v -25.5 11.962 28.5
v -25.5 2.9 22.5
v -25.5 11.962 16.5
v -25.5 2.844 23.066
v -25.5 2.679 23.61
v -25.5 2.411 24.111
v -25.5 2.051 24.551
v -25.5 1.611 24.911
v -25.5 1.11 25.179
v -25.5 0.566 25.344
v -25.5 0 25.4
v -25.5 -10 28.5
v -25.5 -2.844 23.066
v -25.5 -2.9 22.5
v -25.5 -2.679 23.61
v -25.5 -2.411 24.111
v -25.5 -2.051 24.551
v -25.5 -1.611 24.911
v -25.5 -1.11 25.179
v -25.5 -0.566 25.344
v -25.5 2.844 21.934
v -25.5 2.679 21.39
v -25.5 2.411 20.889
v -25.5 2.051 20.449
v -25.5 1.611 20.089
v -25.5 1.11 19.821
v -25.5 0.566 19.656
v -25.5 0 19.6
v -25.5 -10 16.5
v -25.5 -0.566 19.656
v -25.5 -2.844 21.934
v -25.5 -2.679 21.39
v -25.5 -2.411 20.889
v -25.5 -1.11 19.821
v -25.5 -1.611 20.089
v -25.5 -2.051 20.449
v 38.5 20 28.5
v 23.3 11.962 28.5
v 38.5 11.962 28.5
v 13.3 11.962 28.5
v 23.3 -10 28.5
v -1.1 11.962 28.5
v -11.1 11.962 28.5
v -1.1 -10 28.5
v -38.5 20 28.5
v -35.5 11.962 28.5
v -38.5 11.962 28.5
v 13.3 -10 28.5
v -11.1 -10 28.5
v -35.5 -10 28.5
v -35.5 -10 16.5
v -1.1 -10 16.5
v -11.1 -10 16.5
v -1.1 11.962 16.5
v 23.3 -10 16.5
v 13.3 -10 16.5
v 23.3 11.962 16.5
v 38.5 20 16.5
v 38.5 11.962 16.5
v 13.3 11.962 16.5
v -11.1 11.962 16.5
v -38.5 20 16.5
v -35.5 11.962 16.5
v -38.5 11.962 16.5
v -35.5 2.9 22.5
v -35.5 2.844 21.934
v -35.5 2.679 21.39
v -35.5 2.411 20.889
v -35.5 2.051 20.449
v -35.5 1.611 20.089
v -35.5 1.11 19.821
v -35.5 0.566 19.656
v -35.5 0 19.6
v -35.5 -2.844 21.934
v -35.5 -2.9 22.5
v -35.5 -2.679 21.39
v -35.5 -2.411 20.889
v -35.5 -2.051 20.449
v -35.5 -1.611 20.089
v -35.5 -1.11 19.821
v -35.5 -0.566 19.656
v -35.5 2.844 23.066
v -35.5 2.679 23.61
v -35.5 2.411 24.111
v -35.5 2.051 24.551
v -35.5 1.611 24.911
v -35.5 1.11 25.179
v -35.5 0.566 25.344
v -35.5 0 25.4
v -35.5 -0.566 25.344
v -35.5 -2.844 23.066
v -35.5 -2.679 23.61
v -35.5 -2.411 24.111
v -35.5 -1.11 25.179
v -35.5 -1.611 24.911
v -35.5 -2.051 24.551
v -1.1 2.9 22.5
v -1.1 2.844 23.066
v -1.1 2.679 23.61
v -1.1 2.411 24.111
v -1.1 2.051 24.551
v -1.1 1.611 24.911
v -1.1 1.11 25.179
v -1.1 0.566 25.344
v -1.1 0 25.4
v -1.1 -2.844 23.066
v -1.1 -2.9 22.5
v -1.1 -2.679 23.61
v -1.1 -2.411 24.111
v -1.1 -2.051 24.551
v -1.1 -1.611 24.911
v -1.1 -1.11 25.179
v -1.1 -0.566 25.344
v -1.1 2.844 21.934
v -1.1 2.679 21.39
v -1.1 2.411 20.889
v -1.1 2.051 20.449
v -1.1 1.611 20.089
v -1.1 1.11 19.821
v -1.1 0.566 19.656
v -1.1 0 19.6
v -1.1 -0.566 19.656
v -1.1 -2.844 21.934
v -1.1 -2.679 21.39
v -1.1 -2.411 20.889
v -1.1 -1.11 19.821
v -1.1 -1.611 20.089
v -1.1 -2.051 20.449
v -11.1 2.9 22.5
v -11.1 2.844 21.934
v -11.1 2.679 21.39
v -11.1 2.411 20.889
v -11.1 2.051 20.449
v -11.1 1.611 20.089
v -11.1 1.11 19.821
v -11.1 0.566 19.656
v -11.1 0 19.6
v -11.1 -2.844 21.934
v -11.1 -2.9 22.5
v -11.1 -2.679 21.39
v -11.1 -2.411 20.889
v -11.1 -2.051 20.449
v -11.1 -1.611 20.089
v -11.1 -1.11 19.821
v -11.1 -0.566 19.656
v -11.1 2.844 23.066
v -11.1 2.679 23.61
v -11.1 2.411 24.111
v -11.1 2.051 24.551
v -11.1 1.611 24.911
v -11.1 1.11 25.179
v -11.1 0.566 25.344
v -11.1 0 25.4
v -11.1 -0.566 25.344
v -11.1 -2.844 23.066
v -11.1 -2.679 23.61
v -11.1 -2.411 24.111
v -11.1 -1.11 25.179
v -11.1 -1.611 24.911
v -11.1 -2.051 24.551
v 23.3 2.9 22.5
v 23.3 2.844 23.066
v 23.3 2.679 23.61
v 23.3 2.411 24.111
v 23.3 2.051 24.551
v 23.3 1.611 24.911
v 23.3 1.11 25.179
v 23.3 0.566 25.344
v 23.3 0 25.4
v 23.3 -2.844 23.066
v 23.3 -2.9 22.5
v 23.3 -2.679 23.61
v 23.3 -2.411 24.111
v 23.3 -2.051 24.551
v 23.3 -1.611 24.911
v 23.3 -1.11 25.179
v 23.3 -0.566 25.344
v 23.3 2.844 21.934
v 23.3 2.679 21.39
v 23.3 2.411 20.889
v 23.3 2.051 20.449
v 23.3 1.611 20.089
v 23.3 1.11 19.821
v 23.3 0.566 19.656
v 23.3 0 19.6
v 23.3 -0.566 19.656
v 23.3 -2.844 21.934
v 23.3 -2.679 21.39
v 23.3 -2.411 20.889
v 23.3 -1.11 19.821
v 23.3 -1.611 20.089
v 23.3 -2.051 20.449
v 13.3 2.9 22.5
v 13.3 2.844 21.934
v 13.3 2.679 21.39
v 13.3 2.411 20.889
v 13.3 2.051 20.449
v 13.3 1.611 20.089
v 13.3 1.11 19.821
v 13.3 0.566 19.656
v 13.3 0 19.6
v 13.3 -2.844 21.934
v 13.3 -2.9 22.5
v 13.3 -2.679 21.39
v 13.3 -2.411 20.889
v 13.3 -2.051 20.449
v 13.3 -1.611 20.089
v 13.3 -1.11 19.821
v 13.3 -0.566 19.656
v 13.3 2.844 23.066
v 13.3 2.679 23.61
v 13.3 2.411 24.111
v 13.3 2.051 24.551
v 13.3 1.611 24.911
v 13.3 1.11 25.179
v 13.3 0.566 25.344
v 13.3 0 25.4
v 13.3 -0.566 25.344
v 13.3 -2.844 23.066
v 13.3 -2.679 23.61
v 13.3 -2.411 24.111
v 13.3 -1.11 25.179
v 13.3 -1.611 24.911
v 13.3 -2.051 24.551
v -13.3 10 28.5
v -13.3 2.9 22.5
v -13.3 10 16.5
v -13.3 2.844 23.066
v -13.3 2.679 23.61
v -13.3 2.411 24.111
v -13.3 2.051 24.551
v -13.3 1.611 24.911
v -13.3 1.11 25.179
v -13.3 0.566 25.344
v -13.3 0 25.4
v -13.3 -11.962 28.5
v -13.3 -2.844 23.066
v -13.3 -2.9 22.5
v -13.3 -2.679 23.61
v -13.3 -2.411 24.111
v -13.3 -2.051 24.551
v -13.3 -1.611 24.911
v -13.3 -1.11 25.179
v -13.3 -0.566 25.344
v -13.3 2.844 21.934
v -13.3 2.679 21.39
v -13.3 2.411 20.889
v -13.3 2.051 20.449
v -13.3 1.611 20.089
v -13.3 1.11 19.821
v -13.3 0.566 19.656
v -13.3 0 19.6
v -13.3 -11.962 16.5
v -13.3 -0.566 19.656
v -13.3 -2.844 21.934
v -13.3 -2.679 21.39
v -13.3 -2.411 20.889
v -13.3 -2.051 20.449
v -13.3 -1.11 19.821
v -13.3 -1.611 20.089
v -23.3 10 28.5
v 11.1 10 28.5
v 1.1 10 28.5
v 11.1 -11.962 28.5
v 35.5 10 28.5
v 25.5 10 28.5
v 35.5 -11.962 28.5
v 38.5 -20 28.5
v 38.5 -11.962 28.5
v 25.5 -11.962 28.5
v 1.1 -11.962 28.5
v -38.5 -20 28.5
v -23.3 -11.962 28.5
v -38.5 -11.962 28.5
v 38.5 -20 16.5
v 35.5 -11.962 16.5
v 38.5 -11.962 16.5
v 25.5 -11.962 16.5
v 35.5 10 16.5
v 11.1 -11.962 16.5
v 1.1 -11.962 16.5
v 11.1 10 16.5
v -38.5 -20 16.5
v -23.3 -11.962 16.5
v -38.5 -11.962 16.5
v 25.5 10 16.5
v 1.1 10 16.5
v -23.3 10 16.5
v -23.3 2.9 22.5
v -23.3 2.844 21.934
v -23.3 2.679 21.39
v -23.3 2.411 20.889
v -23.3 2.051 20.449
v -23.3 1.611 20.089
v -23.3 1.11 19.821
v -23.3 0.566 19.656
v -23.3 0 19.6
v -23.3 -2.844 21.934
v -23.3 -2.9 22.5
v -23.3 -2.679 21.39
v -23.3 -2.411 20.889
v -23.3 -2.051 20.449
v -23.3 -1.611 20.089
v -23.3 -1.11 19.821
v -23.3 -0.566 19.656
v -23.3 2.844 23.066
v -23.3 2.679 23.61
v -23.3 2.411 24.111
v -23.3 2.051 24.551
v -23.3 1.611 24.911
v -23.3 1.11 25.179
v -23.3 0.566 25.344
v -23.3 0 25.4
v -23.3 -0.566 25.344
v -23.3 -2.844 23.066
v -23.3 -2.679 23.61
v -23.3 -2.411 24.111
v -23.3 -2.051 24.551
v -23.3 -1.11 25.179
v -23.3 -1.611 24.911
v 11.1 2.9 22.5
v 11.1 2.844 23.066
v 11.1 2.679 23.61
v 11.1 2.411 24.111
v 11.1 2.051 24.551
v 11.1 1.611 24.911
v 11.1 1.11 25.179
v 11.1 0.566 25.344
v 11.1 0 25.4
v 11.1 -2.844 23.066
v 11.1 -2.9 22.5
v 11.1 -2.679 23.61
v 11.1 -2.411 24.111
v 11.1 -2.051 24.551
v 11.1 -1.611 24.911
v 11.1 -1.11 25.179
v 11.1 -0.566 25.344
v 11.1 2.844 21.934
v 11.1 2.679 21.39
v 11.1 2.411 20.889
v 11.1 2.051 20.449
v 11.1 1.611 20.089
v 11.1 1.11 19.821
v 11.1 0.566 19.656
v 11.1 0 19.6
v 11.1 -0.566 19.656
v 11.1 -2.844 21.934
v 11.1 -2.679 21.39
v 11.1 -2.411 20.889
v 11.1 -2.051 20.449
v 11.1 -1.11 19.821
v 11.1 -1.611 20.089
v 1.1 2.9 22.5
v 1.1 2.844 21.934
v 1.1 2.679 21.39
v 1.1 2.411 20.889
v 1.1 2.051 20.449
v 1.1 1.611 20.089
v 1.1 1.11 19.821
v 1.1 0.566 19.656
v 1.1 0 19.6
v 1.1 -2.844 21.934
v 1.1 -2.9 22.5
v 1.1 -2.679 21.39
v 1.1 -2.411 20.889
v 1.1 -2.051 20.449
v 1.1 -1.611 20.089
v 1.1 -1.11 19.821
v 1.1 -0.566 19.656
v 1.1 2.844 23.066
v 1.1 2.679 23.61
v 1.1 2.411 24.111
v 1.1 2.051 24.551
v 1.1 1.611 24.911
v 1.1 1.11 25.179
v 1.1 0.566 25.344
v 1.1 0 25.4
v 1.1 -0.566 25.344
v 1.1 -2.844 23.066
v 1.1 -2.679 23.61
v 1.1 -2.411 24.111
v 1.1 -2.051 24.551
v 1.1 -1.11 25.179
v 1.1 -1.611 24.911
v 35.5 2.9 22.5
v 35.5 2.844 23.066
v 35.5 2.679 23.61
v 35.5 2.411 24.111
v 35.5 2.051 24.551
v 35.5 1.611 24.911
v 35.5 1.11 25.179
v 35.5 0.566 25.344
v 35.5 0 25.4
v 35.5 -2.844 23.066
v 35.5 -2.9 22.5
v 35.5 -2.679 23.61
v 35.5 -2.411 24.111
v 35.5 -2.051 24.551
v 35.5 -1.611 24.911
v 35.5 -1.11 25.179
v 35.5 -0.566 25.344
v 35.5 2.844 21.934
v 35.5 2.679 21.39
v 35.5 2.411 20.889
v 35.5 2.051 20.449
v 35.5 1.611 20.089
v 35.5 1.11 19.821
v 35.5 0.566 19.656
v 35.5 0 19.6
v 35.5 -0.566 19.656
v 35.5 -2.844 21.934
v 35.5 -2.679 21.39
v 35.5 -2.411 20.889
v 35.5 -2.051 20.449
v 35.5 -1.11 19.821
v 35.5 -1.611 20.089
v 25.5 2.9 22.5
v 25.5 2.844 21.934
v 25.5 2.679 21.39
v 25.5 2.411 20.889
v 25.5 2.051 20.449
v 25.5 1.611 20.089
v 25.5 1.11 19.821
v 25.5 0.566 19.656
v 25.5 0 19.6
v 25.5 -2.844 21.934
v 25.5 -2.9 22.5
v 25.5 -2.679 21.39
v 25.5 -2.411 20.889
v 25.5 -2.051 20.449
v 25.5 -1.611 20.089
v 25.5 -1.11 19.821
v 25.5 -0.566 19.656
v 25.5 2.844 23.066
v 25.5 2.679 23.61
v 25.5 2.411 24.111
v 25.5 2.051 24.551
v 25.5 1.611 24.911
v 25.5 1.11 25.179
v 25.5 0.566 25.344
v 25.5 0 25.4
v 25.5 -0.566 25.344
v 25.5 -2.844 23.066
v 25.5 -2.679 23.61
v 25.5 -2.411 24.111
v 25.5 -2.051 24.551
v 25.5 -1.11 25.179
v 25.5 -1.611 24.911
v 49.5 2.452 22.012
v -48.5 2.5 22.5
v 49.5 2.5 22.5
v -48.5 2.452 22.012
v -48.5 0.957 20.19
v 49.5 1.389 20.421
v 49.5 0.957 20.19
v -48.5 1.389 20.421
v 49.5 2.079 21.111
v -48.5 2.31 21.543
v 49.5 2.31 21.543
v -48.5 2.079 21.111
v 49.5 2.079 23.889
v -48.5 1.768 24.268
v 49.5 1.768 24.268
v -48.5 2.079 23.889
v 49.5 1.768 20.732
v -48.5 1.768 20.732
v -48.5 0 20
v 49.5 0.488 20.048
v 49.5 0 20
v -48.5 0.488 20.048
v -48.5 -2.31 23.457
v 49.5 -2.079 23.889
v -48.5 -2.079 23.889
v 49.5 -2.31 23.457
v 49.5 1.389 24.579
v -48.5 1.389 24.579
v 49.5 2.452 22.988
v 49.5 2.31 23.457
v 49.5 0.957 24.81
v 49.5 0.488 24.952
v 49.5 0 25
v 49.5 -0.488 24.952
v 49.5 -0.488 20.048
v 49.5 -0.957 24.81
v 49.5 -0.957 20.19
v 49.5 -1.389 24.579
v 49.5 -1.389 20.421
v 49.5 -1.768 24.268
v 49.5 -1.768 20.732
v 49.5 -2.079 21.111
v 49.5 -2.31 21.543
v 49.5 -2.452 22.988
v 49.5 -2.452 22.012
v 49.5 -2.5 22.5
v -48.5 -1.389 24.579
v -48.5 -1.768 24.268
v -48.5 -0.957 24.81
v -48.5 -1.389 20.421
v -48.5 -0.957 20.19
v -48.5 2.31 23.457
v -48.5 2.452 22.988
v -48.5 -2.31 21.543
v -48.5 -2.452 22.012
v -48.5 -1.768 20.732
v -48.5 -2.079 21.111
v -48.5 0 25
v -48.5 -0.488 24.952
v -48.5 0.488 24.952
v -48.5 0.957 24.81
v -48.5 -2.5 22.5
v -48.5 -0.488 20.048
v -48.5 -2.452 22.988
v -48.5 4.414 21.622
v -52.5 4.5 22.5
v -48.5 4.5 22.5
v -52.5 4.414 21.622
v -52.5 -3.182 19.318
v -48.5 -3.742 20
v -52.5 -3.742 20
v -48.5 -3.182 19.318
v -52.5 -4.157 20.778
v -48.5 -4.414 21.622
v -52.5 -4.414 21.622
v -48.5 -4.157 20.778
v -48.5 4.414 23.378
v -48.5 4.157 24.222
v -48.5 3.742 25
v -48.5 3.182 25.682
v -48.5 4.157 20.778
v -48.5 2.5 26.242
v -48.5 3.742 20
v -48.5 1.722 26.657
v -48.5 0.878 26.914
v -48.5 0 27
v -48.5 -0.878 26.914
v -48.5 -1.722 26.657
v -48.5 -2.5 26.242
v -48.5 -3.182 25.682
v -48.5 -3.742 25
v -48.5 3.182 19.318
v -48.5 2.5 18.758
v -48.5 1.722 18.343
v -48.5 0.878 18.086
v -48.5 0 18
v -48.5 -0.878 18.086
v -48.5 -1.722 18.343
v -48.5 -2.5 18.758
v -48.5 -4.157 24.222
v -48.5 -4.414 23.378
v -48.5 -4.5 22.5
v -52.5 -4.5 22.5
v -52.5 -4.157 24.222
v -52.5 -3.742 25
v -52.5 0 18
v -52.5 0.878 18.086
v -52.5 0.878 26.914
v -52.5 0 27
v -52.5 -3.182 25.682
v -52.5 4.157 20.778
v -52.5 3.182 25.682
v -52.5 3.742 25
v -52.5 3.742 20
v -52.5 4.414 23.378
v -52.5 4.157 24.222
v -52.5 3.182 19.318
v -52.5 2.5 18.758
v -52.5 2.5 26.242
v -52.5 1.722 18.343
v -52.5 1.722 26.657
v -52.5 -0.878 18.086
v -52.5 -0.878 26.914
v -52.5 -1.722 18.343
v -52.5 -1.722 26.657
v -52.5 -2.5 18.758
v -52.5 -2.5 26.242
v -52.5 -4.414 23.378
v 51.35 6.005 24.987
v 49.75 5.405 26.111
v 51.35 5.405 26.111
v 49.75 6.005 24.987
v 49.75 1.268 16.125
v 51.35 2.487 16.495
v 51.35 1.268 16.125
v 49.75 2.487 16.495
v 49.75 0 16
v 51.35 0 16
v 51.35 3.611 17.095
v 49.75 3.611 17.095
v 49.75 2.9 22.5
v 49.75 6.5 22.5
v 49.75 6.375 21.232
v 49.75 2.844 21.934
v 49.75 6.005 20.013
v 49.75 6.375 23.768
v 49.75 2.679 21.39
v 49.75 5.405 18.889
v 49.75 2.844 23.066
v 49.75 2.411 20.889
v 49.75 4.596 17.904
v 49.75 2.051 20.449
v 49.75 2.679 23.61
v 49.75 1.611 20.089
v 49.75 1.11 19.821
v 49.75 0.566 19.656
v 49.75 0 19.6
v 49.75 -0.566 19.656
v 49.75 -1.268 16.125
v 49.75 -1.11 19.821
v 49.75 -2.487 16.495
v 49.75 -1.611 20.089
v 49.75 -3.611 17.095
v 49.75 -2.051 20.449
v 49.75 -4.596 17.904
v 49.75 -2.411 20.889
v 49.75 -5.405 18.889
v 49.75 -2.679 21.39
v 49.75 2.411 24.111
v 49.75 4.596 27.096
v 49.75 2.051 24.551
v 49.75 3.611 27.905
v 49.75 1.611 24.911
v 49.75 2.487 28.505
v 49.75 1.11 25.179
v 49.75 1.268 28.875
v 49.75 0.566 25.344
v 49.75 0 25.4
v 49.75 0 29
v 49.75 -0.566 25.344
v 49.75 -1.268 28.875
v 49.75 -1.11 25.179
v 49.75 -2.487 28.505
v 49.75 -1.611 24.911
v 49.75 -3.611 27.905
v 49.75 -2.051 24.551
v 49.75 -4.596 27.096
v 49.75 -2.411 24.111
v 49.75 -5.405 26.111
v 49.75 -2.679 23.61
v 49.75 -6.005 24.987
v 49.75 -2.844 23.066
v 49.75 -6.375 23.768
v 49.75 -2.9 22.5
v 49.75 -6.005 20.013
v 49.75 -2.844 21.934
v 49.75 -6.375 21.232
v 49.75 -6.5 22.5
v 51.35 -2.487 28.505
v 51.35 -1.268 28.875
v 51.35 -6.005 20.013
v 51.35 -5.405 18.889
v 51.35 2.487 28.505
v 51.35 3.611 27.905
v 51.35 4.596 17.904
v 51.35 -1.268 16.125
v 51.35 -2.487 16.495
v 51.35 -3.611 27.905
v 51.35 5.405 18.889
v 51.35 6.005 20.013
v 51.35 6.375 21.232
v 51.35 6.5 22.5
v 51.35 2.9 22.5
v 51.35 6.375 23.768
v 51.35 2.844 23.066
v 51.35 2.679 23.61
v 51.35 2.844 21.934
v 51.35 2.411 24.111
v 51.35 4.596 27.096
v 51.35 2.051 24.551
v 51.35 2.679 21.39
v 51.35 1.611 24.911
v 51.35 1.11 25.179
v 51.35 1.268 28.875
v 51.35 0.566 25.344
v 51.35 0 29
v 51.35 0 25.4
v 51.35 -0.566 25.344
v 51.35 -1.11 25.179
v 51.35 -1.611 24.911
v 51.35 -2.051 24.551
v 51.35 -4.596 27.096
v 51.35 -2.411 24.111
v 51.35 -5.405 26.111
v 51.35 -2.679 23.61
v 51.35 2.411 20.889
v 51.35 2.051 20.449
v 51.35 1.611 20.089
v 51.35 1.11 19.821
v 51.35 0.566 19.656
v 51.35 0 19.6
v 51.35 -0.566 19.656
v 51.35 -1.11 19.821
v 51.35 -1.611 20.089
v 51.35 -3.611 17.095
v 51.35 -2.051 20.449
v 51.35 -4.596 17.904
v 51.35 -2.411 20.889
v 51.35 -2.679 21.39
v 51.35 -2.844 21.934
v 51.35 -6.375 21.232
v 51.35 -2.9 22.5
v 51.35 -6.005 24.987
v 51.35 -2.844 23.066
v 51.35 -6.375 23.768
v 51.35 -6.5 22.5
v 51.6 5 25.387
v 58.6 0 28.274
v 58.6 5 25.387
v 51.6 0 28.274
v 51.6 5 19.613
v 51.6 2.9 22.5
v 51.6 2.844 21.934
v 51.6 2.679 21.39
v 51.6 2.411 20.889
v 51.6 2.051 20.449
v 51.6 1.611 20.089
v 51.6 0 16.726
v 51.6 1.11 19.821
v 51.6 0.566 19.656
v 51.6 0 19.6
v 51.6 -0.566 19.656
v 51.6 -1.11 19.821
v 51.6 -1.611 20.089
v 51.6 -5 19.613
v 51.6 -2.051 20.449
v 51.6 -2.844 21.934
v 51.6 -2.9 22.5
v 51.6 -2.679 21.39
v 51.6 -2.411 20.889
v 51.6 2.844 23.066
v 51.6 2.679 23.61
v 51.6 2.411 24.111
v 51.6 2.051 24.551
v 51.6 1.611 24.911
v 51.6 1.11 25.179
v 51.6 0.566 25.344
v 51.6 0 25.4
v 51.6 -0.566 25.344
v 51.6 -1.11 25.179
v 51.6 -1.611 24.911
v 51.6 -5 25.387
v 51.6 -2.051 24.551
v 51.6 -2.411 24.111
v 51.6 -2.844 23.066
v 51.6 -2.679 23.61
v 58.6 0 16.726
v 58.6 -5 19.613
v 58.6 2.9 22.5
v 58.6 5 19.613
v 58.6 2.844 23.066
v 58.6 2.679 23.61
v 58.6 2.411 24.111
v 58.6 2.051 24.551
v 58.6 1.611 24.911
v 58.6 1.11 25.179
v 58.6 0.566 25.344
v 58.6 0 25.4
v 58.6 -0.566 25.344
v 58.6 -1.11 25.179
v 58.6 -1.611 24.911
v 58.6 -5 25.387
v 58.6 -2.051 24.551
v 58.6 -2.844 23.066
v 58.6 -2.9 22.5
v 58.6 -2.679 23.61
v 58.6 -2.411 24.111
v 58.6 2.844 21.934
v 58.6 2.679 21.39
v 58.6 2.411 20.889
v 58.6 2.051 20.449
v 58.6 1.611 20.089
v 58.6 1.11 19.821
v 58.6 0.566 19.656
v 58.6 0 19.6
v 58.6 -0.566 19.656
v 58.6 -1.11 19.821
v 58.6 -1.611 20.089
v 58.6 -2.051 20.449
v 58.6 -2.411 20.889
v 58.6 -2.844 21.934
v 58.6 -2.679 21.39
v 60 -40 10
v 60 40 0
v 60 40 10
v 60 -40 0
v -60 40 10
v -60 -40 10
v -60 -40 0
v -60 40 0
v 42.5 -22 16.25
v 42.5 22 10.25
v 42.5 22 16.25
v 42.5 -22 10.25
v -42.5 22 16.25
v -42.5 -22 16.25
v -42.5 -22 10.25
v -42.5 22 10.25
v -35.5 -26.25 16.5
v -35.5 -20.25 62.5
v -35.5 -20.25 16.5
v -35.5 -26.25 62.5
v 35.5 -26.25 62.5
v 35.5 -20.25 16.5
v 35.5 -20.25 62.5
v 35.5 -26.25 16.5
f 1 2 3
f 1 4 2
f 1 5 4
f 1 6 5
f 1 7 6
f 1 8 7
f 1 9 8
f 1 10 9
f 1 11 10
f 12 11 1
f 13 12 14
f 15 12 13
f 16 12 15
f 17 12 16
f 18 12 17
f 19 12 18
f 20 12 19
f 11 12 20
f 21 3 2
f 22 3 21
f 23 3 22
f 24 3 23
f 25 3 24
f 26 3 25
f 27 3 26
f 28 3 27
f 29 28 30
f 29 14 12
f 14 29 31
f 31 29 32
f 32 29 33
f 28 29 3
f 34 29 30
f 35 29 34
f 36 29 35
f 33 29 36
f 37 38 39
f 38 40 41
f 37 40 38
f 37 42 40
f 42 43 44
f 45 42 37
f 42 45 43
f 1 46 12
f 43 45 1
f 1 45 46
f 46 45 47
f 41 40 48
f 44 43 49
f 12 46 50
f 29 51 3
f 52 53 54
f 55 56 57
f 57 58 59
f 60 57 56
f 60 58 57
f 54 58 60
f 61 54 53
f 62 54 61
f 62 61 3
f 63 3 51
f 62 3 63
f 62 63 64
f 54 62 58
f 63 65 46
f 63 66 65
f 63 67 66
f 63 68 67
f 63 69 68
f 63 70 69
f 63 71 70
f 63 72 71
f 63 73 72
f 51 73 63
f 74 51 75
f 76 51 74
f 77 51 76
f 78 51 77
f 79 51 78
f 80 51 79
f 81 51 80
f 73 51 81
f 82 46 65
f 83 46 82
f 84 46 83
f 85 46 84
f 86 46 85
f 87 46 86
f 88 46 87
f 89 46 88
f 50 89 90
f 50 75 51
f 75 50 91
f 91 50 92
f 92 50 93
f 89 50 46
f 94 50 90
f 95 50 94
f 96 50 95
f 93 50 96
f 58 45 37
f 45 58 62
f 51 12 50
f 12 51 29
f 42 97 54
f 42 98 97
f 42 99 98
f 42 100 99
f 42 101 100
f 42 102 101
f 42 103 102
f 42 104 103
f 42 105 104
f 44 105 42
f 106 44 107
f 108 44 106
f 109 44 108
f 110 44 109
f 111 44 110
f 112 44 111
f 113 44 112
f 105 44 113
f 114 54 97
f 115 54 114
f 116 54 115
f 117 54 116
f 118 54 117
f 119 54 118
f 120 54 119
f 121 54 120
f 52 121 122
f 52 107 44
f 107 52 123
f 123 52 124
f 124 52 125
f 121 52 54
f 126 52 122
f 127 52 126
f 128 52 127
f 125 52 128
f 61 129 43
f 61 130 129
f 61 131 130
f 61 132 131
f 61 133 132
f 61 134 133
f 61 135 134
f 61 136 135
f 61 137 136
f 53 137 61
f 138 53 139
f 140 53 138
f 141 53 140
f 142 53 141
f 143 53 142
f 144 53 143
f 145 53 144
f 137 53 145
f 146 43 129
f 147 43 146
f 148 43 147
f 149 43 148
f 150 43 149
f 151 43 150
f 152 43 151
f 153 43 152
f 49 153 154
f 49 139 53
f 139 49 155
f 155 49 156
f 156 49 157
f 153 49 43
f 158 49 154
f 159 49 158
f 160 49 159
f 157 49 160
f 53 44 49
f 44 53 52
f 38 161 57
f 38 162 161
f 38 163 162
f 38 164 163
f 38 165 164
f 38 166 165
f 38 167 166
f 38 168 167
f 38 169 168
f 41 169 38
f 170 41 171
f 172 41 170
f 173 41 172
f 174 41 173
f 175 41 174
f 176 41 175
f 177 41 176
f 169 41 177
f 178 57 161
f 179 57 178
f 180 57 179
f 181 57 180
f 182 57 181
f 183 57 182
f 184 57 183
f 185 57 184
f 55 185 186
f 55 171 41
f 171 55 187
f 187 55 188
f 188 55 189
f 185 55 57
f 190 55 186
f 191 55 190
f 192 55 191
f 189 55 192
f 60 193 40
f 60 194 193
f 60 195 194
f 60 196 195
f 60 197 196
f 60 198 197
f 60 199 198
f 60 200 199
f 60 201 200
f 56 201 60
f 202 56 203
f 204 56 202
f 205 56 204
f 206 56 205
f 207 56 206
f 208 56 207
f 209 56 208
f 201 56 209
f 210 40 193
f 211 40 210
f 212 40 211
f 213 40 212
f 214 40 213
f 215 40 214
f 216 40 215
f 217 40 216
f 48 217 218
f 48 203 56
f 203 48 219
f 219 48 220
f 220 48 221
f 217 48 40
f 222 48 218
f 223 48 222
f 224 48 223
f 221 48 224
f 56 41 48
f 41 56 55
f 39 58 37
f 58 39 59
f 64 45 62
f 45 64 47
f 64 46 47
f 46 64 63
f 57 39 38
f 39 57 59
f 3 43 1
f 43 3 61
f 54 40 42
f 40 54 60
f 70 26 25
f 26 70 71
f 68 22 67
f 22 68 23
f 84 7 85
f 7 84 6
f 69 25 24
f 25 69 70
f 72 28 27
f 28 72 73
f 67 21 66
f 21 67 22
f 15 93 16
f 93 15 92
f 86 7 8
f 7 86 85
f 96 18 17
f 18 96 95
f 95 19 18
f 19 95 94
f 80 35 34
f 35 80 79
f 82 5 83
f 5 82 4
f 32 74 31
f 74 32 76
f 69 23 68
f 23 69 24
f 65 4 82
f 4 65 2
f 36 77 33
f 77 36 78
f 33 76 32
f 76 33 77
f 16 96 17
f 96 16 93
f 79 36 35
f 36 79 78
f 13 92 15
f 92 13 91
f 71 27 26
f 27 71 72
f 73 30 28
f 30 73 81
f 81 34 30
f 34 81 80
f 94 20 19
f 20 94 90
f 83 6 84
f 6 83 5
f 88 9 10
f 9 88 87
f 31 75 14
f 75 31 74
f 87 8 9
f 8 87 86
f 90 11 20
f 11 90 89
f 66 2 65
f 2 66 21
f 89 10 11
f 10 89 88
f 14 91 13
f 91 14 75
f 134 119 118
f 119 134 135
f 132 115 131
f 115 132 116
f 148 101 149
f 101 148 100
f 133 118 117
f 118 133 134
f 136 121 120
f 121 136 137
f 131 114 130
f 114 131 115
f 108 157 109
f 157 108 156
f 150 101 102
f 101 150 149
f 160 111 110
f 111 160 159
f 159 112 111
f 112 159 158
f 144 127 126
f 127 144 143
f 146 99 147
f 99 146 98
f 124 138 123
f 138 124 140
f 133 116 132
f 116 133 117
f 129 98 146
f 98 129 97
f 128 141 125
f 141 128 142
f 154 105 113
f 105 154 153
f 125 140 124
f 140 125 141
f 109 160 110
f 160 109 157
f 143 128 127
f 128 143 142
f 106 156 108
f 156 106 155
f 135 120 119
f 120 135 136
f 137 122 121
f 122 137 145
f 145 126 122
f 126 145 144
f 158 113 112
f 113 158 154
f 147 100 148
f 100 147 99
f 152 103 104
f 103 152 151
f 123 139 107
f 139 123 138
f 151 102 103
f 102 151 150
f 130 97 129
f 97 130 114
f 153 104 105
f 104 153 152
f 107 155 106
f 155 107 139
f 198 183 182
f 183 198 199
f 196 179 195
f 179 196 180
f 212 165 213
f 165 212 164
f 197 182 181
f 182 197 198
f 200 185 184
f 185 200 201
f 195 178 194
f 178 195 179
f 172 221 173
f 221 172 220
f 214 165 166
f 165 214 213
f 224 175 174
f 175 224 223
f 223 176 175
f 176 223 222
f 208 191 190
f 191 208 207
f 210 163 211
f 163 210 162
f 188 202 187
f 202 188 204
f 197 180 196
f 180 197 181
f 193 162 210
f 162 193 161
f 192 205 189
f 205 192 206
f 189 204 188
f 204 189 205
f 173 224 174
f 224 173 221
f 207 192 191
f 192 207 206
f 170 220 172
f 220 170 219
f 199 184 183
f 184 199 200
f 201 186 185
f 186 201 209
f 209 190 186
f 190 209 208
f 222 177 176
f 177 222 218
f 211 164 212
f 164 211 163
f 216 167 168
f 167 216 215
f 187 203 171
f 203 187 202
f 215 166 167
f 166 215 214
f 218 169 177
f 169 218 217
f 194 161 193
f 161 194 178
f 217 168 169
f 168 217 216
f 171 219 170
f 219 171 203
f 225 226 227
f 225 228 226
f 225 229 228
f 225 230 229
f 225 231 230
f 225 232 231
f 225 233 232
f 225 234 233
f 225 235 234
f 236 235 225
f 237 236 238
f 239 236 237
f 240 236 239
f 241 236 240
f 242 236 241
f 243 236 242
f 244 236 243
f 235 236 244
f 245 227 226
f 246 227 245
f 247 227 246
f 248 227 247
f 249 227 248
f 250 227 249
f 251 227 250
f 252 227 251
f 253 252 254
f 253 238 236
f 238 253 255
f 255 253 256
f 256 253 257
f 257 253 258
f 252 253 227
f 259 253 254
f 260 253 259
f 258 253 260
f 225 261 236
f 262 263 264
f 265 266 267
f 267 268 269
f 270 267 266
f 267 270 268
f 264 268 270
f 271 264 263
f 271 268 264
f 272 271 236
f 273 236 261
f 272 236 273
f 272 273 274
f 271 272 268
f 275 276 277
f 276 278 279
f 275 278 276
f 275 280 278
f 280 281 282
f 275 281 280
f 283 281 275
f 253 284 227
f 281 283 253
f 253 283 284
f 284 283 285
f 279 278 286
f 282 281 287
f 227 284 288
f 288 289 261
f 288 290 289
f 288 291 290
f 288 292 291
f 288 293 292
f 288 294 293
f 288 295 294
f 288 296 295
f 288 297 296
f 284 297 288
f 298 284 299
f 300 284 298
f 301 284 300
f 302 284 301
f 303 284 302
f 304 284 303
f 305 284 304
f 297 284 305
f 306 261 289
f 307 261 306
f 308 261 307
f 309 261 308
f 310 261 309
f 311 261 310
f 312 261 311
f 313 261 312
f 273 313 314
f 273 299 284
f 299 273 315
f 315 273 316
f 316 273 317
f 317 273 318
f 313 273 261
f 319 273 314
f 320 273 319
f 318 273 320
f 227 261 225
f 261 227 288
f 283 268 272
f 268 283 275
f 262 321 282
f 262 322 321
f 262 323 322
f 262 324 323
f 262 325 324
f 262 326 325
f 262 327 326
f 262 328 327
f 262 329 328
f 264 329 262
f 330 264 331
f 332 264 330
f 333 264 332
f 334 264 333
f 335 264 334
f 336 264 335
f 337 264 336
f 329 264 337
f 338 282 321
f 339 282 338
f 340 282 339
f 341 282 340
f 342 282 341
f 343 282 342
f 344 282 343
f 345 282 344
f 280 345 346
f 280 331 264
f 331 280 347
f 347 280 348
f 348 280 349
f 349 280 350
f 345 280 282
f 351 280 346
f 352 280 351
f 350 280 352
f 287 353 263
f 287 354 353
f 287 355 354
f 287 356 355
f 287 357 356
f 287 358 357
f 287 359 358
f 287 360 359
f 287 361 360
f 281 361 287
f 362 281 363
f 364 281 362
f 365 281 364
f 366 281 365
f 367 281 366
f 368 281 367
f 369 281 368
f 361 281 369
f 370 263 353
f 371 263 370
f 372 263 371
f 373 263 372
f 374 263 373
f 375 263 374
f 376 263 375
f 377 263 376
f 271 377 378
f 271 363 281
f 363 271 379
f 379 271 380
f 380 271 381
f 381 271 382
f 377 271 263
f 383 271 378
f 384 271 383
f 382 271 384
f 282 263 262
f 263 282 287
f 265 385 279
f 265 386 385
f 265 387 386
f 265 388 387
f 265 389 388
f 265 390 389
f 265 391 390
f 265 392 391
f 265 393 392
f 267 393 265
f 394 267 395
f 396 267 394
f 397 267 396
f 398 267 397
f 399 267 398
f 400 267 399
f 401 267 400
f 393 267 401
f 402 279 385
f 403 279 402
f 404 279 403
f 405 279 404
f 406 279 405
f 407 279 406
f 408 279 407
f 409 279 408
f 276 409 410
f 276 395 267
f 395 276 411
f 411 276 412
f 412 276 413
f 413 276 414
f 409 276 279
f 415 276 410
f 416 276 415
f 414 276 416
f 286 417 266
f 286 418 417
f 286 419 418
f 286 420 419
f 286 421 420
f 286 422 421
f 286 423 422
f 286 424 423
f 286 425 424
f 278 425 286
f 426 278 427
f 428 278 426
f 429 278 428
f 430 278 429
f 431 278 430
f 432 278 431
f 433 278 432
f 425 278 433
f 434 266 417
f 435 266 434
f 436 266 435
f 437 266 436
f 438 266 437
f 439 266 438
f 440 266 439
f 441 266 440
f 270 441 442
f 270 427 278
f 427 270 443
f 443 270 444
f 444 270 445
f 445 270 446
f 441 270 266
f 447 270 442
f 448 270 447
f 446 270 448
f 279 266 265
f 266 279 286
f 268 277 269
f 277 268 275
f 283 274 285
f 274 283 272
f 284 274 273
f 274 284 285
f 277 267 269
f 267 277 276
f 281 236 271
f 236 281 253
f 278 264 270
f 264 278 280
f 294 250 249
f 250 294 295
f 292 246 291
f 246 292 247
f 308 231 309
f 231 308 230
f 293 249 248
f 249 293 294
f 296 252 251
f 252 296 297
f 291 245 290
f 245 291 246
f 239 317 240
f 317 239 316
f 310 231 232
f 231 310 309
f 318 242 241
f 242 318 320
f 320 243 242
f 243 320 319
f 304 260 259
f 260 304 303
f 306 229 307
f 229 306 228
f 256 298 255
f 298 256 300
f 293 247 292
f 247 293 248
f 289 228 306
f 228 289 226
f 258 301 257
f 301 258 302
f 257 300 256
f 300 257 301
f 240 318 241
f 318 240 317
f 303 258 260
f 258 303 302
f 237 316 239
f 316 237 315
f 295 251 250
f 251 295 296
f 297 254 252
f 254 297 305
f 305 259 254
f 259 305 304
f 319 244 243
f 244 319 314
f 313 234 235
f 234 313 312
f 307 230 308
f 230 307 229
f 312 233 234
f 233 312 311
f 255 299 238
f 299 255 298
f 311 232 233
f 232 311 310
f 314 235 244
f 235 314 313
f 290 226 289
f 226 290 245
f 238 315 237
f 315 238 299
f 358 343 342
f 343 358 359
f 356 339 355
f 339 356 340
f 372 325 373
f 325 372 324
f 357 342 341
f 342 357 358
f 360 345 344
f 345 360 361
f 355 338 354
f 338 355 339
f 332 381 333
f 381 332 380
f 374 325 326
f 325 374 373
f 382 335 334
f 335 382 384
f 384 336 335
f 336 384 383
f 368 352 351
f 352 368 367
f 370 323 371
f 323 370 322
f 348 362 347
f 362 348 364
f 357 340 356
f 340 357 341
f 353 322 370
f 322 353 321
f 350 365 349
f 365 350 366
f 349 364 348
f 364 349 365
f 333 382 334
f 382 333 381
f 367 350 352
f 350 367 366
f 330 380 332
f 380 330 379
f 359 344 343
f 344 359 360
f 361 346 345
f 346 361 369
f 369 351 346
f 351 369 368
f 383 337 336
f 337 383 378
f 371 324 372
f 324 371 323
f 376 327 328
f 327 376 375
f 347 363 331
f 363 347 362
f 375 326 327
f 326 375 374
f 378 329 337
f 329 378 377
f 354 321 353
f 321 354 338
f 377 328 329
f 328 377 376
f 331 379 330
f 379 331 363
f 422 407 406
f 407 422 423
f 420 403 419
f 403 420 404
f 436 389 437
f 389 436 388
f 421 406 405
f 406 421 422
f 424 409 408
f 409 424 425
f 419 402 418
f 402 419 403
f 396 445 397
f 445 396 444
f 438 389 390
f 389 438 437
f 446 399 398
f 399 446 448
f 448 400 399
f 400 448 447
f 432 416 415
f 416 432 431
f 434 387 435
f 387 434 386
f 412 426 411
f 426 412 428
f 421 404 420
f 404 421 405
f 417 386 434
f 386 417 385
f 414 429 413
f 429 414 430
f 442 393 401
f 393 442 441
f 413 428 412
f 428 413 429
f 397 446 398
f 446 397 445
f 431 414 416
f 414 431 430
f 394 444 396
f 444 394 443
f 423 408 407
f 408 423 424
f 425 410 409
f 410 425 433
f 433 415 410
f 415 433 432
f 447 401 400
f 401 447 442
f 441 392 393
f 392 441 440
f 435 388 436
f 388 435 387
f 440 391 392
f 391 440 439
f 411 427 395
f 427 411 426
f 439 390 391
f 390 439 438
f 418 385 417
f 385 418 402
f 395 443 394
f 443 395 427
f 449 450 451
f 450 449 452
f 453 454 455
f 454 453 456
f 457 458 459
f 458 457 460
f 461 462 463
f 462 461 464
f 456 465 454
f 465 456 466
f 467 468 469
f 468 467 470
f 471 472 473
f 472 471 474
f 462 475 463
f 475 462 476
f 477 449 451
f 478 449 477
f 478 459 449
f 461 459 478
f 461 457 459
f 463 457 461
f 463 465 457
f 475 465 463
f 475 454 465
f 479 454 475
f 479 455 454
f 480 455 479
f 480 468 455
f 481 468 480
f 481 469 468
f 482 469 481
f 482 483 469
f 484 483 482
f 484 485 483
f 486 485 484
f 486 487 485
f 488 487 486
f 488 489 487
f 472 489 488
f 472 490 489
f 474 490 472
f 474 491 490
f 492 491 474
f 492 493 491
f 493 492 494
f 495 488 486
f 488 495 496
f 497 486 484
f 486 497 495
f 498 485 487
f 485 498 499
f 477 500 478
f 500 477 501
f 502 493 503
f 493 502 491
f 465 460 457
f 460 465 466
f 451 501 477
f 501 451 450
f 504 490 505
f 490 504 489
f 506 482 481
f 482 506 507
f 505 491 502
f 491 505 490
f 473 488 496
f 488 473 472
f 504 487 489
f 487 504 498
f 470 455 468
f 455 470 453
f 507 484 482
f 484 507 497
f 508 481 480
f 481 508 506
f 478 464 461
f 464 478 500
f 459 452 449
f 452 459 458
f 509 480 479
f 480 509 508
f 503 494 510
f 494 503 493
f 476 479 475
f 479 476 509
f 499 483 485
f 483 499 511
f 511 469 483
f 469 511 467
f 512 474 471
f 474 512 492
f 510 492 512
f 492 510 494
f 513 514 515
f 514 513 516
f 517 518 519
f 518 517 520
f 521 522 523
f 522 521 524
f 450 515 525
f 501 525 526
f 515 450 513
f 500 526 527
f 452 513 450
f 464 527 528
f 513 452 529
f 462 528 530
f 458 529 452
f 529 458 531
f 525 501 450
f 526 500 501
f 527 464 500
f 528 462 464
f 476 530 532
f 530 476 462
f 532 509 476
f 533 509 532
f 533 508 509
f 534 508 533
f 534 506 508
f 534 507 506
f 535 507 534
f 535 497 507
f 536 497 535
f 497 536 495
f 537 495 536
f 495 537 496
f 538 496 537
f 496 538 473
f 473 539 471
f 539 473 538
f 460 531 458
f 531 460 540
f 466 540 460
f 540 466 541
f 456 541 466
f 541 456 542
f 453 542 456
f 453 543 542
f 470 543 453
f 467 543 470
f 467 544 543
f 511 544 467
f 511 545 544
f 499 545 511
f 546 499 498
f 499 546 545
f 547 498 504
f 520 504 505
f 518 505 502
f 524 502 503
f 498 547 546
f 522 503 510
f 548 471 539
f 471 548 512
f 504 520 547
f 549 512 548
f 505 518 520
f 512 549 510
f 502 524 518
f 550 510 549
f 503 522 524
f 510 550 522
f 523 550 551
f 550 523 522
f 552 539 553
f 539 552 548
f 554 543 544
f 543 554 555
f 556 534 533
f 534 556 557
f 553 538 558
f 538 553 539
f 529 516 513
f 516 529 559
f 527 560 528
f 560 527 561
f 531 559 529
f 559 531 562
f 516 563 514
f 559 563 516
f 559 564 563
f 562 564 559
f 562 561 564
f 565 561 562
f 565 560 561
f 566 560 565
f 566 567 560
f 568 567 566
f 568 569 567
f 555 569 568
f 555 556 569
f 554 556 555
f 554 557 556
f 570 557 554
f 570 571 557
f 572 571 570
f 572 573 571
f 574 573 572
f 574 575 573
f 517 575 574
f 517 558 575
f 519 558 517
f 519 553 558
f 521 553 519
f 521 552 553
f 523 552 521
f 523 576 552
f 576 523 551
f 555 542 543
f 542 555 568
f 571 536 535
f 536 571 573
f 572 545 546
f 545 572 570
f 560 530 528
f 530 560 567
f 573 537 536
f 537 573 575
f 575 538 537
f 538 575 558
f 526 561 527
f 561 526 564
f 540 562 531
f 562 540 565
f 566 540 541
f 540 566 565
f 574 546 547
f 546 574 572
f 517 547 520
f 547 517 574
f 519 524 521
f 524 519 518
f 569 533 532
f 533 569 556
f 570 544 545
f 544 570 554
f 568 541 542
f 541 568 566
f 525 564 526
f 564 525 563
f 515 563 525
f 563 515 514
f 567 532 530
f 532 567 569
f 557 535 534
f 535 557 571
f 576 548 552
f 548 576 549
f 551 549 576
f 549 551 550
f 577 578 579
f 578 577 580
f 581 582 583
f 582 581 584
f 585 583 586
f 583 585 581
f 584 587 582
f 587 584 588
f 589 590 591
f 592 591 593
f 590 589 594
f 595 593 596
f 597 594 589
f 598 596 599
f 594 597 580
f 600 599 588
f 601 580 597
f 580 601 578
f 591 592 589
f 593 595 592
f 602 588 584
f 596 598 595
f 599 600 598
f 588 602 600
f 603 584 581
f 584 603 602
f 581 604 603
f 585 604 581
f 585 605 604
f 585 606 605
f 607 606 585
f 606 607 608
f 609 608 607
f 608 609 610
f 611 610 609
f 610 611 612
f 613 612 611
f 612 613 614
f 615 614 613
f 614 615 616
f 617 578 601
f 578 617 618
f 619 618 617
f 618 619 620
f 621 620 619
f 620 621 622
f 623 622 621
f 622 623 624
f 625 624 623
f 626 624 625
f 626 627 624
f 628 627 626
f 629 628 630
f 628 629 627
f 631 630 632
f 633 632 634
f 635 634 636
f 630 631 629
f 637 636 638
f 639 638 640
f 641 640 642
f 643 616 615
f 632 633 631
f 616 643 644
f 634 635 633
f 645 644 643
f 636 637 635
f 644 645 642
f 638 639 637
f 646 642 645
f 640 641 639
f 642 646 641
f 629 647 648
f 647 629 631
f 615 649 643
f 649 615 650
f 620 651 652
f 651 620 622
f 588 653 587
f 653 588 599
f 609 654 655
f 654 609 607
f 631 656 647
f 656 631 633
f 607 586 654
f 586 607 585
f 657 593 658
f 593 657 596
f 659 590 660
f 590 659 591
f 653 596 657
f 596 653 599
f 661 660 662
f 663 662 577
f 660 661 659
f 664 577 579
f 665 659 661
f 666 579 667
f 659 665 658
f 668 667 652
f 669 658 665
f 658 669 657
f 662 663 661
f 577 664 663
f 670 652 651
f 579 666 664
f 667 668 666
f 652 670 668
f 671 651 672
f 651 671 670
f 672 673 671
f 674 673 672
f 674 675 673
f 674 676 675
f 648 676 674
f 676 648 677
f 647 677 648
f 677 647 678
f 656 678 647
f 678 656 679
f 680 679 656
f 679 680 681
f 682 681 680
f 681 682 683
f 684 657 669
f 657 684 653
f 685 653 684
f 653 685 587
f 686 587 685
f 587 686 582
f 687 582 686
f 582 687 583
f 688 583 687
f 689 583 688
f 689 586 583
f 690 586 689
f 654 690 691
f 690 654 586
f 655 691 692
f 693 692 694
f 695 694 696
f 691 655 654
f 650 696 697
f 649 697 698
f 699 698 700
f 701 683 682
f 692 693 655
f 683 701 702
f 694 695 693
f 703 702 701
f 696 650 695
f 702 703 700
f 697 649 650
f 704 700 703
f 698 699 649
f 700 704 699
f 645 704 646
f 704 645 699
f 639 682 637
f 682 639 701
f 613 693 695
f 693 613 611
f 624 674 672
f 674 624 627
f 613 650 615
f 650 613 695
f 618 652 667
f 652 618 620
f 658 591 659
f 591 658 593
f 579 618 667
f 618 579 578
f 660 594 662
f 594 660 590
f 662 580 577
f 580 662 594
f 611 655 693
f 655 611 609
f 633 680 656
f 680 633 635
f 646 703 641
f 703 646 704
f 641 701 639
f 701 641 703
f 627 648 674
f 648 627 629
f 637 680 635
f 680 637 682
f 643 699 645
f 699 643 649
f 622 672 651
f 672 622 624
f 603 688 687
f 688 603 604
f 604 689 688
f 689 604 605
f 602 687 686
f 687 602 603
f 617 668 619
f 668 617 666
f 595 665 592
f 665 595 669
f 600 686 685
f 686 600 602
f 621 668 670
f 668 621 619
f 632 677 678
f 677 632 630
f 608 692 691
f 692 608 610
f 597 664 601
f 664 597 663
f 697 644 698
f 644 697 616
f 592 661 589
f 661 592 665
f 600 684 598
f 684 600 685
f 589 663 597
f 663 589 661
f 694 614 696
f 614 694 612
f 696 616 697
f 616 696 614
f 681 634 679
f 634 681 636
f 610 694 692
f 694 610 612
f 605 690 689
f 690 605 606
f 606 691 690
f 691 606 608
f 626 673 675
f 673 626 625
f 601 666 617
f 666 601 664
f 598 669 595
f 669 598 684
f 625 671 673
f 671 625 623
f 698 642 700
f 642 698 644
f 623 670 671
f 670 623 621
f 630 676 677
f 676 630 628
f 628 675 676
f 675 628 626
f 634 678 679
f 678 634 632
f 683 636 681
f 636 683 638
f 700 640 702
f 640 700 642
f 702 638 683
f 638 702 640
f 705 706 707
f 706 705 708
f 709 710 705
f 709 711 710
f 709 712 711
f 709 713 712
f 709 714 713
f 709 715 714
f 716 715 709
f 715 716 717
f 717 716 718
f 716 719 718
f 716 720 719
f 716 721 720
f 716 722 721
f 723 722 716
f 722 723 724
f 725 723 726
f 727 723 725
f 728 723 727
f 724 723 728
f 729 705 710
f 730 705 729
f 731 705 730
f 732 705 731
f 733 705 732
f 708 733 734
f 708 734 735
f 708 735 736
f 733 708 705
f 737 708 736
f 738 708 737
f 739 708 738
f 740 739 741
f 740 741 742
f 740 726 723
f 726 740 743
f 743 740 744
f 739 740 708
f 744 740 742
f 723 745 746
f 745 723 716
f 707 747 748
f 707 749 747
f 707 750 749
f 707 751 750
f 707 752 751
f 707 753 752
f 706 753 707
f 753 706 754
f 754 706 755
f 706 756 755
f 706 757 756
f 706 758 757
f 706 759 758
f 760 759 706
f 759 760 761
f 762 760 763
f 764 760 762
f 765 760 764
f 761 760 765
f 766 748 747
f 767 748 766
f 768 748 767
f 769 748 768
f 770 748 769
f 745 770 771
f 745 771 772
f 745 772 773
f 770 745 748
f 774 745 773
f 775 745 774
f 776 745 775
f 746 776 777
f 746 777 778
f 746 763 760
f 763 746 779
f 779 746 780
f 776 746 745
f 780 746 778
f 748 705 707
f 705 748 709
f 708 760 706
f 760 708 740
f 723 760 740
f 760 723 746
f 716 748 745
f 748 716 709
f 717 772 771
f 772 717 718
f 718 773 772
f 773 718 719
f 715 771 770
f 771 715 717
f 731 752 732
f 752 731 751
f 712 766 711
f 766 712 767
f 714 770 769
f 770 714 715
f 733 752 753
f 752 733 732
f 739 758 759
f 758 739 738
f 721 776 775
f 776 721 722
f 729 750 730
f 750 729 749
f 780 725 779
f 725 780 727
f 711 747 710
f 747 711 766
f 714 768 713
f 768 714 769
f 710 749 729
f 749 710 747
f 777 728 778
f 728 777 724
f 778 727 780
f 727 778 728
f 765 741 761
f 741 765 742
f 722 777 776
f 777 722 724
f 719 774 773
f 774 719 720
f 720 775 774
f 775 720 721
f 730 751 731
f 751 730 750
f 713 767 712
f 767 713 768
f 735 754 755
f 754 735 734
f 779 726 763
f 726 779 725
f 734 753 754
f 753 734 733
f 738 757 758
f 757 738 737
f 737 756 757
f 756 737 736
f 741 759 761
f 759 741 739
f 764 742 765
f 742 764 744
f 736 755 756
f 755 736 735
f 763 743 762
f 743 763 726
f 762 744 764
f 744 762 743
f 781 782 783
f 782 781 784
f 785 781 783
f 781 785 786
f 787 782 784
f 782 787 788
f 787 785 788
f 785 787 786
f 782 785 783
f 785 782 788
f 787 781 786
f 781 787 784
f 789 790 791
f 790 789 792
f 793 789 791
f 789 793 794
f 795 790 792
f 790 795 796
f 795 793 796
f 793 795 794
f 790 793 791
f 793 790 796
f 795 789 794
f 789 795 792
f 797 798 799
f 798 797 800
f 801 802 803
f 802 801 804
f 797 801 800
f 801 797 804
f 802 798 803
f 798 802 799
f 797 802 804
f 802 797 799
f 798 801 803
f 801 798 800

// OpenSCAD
$fn = 32;

// ------------------------------------------------------------------------
// Comb hinge with flap: leaf 77 x 20 mm, pin d5, flap 46 mm
// Every part is its own module, assembly() places every instance.
// ------------------------------------------------------------------------

// --- part 1 ---
module hinge_bed() {
  difference() {
    translate([-60, -40, 0]) cube([120, 80, 10]);
  }
}

// --- part 2 ---
module hinge_riser() {
  difference() {
    translate([-42.5, -22, 0]) cube([85, 44, 6]);
  }
}

// --- part 3 ---
module hinge_leaf_a() {
  difference() {
    union() {
      translate([-35.5, -10, -6]) cube([10, 30, 12]);
      translate([-11.1, -10, -6]) cube([10, 30, 12]);
      translate([13.3, -10, -6]) cube([10, 30, 12]);
      translate([-38.5, 11.962, -6]) cube([77, 8.038, 12]);
    }
    translate([-30.5, 0, 0]) rotate([0, 90, 0]) cylinder(h = 12, d = 5.8, center = true);
    translate([-6.1, 0, 0]) rotate([0, 90, 0]) cylinder(h = 12, d = 5.8, center = true);
    translate([18.3, 0, 0]) rotate([0, 90, 0]) cylinder(h = 12, d = 5.8, center = true);
  }
}

// --- part 4 ---
module hinge_leaf_b() {
  difference() {
    union() {
      translate([-23.3, -20, -6]) cube([10, 30, 12]);
      translate([1.1, -20, -6]) cube([10, 30, 12]);
      translate([25.5, -20, -6]) cube([10, 30, 12]);
      translate([-38.5, -20, -6]) cube([77, 8.038, 12]);
    }
    translate([-18.3, 0, 0]) rotate([0, 90, 0]) cylinder(h = 12, d = 5.8, center = true);
    translate([6.1, 0, 0]) rotate([0, 90, 0]) cylinder(h = 12, d = 5.8, center = true);
    translate([30.5, 0, 0]) rotate([0, 90, 0]) cylinder(h = 12, d = 5.8, center = true);
  }
}

// --- part 5 ---
module hinge_flap() {
  difference() {
    translate([-35.5, -23, 0]) cube([71, 46, 6]);
  }
}

// --- part 6 ---
module hinge_pin() {
  rotate([0, 90, 0]) cylinder(h = 99, d = 5, center = true);
  translate([-52.5, 0, 0]) rotate([0, 90, 0]) cylinder(h = 4, d = 9);
}

// --- part 7 ---
module pin_washer() {
  difference() {
      translate([0, 0, 0]) cylinder(h = 1.6, d = 13);
      translate([0, 0, -1]) cylinder(h = 3.6, d = 5.8);
    }
}

// --- part 8 ---
module pin_nut() {
  difference() {
    linear_extrude(height = 7) polygon(points = [[5.774, 0], [2.887, 5], [-2.887, 5], [-5.774, 0], [-2.887, -5], [2.887, -5]]);
    translate([0, 0, -1]) cylinder(h = 9, d = 5.8);
  }
}

// --- assembly ---
module assembly() {
  color([0.80, 0.24, 0.20]) translate([0, 0, 0]) rotate([0, 0, 0]) hinge_bed();
  color([0.20, 0.45, 0.75]) translate([0, 0, 10.25]) rotate([0, 0, 0]) hinge_riser();
  color([0.25, 0.62, 0.32]) translate([0, 0, 22.5]) rotate([0, 0, 0]) hinge_leaf_a();
  color([0.92, 0.70, 0.18]) translate([0, 0, 22.5]) rotate([0, 0, 0]) hinge_leaf_b();
  color([0.58, 0.35, 0.70]) translate([0, -20.25, 39.5]) rotate([90, 0, 0]) hinge_flap();
  color([0.16, 0.66, 0.66]) translate([0, 0, 22.5]) rotate([0, 0, 0]) hinge_pin();
  color([0.85, 0.48, 0.18]) translate([49.75, 0, 22.5]) rotate([0, 90, 0]) pin_washer();
  color([0.55, 0.60, 0.65]) translate([51.6, 0, 22.5]) rotate([0, 90, 0]) pin_nut();
}

assembly();
